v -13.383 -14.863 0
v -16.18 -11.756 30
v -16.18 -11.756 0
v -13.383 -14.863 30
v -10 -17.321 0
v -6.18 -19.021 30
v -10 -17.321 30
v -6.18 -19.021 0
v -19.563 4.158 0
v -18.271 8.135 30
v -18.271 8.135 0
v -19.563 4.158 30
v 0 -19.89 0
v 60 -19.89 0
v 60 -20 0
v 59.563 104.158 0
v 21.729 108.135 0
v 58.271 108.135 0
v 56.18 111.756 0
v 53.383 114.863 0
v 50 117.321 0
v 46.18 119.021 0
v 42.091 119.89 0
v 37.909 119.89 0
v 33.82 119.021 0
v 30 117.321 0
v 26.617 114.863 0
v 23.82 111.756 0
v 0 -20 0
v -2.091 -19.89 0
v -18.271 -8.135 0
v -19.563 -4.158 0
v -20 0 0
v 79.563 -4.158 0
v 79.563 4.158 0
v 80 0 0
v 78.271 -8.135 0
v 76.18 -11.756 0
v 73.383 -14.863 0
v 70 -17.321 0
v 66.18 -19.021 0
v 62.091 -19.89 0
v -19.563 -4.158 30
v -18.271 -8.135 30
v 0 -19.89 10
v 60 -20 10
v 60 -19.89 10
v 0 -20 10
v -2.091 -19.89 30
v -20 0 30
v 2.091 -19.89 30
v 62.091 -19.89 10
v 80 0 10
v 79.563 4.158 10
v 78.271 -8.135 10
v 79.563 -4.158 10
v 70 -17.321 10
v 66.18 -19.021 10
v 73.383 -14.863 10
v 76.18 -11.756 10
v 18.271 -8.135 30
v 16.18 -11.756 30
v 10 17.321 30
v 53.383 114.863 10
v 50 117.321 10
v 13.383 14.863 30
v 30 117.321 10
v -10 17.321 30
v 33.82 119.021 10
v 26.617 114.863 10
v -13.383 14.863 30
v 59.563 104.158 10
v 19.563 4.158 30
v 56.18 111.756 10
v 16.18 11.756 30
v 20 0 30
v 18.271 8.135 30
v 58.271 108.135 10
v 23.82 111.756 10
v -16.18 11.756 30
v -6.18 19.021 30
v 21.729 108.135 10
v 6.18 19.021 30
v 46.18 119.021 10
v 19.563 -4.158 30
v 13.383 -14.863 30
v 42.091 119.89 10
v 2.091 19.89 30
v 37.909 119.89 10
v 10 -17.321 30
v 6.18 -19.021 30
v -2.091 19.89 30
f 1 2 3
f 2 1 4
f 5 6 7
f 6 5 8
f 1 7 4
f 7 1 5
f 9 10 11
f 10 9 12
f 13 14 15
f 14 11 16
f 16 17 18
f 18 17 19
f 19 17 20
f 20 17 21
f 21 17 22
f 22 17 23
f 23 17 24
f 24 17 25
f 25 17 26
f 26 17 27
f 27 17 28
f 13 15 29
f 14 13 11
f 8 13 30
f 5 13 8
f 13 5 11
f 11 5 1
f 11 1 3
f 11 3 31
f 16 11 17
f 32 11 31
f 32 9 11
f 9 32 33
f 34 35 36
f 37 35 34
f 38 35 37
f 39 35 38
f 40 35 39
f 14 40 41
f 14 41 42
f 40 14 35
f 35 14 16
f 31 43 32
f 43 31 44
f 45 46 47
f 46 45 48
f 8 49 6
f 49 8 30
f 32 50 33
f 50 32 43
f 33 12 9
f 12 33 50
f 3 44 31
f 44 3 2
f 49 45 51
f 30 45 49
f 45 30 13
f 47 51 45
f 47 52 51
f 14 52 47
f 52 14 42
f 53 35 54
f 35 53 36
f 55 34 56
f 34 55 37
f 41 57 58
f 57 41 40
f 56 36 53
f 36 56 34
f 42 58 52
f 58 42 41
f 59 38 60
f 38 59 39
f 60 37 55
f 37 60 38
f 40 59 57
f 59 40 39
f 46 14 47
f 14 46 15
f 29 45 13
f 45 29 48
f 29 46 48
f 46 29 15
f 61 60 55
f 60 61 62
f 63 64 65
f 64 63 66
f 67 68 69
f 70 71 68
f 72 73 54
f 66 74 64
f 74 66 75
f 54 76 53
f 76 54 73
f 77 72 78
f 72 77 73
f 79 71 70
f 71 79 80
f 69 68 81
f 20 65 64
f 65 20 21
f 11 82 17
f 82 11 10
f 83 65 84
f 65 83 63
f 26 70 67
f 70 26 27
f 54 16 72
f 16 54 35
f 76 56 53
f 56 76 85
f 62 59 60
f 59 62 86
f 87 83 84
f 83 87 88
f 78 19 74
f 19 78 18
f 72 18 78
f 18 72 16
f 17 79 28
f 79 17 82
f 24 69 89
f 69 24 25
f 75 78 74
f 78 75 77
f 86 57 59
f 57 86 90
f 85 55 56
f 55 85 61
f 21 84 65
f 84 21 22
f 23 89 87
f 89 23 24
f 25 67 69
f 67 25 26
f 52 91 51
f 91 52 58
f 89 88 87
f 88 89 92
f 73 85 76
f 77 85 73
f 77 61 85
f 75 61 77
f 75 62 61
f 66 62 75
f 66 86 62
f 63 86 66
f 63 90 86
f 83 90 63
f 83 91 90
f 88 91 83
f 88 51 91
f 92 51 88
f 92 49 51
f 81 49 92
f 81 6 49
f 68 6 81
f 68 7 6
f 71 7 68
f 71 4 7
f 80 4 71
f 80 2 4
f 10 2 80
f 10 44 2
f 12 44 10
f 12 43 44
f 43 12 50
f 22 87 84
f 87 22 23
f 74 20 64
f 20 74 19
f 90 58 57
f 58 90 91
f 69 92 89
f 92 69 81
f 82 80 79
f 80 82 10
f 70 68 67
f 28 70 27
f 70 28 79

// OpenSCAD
//Operatii cu variabile

module placa_snowboard(grosime, raza, lungime)
{
cylinder (h=grosime,r=raza);
translate ([lungime - 2*raza,0,0]) cylinder (h=grosime,r=raza);
    translate ([0,-raza,0])cube([lungime-2*raza,2*raza,grosime]);
}
placa_snowboard(grosime=10,raza=20,lungime=100);

//-------------------------

module placa_snowboard2(grosime, raza, lungime)
{
    hull()
    {
        cylinder (h=grosime,r=raza); 
        translate ([lungime - 2*raza,0,0]) cylinder (h=grosime,r=raza);
        
        translate([(lungime-raza)/2,lungime,0])cylinder (h=grosime,r=raza);
        
        cylinder (h=3*grosime, r=raza);
    }
}
placa_snowboard2(grosime=10,raza=20,lungime=100);

//-------------------------

module podium(grosime, raza, lungime)
{
    hull()
    {
        
        cylinder (h=grosime,r=raza); 
        translate ([lungime - 2*raza,0,0]) cylinder (h=grosime,r=raza);
    }
}
placa_snowboard2(grosime=10,raza=20,lungime=100);
